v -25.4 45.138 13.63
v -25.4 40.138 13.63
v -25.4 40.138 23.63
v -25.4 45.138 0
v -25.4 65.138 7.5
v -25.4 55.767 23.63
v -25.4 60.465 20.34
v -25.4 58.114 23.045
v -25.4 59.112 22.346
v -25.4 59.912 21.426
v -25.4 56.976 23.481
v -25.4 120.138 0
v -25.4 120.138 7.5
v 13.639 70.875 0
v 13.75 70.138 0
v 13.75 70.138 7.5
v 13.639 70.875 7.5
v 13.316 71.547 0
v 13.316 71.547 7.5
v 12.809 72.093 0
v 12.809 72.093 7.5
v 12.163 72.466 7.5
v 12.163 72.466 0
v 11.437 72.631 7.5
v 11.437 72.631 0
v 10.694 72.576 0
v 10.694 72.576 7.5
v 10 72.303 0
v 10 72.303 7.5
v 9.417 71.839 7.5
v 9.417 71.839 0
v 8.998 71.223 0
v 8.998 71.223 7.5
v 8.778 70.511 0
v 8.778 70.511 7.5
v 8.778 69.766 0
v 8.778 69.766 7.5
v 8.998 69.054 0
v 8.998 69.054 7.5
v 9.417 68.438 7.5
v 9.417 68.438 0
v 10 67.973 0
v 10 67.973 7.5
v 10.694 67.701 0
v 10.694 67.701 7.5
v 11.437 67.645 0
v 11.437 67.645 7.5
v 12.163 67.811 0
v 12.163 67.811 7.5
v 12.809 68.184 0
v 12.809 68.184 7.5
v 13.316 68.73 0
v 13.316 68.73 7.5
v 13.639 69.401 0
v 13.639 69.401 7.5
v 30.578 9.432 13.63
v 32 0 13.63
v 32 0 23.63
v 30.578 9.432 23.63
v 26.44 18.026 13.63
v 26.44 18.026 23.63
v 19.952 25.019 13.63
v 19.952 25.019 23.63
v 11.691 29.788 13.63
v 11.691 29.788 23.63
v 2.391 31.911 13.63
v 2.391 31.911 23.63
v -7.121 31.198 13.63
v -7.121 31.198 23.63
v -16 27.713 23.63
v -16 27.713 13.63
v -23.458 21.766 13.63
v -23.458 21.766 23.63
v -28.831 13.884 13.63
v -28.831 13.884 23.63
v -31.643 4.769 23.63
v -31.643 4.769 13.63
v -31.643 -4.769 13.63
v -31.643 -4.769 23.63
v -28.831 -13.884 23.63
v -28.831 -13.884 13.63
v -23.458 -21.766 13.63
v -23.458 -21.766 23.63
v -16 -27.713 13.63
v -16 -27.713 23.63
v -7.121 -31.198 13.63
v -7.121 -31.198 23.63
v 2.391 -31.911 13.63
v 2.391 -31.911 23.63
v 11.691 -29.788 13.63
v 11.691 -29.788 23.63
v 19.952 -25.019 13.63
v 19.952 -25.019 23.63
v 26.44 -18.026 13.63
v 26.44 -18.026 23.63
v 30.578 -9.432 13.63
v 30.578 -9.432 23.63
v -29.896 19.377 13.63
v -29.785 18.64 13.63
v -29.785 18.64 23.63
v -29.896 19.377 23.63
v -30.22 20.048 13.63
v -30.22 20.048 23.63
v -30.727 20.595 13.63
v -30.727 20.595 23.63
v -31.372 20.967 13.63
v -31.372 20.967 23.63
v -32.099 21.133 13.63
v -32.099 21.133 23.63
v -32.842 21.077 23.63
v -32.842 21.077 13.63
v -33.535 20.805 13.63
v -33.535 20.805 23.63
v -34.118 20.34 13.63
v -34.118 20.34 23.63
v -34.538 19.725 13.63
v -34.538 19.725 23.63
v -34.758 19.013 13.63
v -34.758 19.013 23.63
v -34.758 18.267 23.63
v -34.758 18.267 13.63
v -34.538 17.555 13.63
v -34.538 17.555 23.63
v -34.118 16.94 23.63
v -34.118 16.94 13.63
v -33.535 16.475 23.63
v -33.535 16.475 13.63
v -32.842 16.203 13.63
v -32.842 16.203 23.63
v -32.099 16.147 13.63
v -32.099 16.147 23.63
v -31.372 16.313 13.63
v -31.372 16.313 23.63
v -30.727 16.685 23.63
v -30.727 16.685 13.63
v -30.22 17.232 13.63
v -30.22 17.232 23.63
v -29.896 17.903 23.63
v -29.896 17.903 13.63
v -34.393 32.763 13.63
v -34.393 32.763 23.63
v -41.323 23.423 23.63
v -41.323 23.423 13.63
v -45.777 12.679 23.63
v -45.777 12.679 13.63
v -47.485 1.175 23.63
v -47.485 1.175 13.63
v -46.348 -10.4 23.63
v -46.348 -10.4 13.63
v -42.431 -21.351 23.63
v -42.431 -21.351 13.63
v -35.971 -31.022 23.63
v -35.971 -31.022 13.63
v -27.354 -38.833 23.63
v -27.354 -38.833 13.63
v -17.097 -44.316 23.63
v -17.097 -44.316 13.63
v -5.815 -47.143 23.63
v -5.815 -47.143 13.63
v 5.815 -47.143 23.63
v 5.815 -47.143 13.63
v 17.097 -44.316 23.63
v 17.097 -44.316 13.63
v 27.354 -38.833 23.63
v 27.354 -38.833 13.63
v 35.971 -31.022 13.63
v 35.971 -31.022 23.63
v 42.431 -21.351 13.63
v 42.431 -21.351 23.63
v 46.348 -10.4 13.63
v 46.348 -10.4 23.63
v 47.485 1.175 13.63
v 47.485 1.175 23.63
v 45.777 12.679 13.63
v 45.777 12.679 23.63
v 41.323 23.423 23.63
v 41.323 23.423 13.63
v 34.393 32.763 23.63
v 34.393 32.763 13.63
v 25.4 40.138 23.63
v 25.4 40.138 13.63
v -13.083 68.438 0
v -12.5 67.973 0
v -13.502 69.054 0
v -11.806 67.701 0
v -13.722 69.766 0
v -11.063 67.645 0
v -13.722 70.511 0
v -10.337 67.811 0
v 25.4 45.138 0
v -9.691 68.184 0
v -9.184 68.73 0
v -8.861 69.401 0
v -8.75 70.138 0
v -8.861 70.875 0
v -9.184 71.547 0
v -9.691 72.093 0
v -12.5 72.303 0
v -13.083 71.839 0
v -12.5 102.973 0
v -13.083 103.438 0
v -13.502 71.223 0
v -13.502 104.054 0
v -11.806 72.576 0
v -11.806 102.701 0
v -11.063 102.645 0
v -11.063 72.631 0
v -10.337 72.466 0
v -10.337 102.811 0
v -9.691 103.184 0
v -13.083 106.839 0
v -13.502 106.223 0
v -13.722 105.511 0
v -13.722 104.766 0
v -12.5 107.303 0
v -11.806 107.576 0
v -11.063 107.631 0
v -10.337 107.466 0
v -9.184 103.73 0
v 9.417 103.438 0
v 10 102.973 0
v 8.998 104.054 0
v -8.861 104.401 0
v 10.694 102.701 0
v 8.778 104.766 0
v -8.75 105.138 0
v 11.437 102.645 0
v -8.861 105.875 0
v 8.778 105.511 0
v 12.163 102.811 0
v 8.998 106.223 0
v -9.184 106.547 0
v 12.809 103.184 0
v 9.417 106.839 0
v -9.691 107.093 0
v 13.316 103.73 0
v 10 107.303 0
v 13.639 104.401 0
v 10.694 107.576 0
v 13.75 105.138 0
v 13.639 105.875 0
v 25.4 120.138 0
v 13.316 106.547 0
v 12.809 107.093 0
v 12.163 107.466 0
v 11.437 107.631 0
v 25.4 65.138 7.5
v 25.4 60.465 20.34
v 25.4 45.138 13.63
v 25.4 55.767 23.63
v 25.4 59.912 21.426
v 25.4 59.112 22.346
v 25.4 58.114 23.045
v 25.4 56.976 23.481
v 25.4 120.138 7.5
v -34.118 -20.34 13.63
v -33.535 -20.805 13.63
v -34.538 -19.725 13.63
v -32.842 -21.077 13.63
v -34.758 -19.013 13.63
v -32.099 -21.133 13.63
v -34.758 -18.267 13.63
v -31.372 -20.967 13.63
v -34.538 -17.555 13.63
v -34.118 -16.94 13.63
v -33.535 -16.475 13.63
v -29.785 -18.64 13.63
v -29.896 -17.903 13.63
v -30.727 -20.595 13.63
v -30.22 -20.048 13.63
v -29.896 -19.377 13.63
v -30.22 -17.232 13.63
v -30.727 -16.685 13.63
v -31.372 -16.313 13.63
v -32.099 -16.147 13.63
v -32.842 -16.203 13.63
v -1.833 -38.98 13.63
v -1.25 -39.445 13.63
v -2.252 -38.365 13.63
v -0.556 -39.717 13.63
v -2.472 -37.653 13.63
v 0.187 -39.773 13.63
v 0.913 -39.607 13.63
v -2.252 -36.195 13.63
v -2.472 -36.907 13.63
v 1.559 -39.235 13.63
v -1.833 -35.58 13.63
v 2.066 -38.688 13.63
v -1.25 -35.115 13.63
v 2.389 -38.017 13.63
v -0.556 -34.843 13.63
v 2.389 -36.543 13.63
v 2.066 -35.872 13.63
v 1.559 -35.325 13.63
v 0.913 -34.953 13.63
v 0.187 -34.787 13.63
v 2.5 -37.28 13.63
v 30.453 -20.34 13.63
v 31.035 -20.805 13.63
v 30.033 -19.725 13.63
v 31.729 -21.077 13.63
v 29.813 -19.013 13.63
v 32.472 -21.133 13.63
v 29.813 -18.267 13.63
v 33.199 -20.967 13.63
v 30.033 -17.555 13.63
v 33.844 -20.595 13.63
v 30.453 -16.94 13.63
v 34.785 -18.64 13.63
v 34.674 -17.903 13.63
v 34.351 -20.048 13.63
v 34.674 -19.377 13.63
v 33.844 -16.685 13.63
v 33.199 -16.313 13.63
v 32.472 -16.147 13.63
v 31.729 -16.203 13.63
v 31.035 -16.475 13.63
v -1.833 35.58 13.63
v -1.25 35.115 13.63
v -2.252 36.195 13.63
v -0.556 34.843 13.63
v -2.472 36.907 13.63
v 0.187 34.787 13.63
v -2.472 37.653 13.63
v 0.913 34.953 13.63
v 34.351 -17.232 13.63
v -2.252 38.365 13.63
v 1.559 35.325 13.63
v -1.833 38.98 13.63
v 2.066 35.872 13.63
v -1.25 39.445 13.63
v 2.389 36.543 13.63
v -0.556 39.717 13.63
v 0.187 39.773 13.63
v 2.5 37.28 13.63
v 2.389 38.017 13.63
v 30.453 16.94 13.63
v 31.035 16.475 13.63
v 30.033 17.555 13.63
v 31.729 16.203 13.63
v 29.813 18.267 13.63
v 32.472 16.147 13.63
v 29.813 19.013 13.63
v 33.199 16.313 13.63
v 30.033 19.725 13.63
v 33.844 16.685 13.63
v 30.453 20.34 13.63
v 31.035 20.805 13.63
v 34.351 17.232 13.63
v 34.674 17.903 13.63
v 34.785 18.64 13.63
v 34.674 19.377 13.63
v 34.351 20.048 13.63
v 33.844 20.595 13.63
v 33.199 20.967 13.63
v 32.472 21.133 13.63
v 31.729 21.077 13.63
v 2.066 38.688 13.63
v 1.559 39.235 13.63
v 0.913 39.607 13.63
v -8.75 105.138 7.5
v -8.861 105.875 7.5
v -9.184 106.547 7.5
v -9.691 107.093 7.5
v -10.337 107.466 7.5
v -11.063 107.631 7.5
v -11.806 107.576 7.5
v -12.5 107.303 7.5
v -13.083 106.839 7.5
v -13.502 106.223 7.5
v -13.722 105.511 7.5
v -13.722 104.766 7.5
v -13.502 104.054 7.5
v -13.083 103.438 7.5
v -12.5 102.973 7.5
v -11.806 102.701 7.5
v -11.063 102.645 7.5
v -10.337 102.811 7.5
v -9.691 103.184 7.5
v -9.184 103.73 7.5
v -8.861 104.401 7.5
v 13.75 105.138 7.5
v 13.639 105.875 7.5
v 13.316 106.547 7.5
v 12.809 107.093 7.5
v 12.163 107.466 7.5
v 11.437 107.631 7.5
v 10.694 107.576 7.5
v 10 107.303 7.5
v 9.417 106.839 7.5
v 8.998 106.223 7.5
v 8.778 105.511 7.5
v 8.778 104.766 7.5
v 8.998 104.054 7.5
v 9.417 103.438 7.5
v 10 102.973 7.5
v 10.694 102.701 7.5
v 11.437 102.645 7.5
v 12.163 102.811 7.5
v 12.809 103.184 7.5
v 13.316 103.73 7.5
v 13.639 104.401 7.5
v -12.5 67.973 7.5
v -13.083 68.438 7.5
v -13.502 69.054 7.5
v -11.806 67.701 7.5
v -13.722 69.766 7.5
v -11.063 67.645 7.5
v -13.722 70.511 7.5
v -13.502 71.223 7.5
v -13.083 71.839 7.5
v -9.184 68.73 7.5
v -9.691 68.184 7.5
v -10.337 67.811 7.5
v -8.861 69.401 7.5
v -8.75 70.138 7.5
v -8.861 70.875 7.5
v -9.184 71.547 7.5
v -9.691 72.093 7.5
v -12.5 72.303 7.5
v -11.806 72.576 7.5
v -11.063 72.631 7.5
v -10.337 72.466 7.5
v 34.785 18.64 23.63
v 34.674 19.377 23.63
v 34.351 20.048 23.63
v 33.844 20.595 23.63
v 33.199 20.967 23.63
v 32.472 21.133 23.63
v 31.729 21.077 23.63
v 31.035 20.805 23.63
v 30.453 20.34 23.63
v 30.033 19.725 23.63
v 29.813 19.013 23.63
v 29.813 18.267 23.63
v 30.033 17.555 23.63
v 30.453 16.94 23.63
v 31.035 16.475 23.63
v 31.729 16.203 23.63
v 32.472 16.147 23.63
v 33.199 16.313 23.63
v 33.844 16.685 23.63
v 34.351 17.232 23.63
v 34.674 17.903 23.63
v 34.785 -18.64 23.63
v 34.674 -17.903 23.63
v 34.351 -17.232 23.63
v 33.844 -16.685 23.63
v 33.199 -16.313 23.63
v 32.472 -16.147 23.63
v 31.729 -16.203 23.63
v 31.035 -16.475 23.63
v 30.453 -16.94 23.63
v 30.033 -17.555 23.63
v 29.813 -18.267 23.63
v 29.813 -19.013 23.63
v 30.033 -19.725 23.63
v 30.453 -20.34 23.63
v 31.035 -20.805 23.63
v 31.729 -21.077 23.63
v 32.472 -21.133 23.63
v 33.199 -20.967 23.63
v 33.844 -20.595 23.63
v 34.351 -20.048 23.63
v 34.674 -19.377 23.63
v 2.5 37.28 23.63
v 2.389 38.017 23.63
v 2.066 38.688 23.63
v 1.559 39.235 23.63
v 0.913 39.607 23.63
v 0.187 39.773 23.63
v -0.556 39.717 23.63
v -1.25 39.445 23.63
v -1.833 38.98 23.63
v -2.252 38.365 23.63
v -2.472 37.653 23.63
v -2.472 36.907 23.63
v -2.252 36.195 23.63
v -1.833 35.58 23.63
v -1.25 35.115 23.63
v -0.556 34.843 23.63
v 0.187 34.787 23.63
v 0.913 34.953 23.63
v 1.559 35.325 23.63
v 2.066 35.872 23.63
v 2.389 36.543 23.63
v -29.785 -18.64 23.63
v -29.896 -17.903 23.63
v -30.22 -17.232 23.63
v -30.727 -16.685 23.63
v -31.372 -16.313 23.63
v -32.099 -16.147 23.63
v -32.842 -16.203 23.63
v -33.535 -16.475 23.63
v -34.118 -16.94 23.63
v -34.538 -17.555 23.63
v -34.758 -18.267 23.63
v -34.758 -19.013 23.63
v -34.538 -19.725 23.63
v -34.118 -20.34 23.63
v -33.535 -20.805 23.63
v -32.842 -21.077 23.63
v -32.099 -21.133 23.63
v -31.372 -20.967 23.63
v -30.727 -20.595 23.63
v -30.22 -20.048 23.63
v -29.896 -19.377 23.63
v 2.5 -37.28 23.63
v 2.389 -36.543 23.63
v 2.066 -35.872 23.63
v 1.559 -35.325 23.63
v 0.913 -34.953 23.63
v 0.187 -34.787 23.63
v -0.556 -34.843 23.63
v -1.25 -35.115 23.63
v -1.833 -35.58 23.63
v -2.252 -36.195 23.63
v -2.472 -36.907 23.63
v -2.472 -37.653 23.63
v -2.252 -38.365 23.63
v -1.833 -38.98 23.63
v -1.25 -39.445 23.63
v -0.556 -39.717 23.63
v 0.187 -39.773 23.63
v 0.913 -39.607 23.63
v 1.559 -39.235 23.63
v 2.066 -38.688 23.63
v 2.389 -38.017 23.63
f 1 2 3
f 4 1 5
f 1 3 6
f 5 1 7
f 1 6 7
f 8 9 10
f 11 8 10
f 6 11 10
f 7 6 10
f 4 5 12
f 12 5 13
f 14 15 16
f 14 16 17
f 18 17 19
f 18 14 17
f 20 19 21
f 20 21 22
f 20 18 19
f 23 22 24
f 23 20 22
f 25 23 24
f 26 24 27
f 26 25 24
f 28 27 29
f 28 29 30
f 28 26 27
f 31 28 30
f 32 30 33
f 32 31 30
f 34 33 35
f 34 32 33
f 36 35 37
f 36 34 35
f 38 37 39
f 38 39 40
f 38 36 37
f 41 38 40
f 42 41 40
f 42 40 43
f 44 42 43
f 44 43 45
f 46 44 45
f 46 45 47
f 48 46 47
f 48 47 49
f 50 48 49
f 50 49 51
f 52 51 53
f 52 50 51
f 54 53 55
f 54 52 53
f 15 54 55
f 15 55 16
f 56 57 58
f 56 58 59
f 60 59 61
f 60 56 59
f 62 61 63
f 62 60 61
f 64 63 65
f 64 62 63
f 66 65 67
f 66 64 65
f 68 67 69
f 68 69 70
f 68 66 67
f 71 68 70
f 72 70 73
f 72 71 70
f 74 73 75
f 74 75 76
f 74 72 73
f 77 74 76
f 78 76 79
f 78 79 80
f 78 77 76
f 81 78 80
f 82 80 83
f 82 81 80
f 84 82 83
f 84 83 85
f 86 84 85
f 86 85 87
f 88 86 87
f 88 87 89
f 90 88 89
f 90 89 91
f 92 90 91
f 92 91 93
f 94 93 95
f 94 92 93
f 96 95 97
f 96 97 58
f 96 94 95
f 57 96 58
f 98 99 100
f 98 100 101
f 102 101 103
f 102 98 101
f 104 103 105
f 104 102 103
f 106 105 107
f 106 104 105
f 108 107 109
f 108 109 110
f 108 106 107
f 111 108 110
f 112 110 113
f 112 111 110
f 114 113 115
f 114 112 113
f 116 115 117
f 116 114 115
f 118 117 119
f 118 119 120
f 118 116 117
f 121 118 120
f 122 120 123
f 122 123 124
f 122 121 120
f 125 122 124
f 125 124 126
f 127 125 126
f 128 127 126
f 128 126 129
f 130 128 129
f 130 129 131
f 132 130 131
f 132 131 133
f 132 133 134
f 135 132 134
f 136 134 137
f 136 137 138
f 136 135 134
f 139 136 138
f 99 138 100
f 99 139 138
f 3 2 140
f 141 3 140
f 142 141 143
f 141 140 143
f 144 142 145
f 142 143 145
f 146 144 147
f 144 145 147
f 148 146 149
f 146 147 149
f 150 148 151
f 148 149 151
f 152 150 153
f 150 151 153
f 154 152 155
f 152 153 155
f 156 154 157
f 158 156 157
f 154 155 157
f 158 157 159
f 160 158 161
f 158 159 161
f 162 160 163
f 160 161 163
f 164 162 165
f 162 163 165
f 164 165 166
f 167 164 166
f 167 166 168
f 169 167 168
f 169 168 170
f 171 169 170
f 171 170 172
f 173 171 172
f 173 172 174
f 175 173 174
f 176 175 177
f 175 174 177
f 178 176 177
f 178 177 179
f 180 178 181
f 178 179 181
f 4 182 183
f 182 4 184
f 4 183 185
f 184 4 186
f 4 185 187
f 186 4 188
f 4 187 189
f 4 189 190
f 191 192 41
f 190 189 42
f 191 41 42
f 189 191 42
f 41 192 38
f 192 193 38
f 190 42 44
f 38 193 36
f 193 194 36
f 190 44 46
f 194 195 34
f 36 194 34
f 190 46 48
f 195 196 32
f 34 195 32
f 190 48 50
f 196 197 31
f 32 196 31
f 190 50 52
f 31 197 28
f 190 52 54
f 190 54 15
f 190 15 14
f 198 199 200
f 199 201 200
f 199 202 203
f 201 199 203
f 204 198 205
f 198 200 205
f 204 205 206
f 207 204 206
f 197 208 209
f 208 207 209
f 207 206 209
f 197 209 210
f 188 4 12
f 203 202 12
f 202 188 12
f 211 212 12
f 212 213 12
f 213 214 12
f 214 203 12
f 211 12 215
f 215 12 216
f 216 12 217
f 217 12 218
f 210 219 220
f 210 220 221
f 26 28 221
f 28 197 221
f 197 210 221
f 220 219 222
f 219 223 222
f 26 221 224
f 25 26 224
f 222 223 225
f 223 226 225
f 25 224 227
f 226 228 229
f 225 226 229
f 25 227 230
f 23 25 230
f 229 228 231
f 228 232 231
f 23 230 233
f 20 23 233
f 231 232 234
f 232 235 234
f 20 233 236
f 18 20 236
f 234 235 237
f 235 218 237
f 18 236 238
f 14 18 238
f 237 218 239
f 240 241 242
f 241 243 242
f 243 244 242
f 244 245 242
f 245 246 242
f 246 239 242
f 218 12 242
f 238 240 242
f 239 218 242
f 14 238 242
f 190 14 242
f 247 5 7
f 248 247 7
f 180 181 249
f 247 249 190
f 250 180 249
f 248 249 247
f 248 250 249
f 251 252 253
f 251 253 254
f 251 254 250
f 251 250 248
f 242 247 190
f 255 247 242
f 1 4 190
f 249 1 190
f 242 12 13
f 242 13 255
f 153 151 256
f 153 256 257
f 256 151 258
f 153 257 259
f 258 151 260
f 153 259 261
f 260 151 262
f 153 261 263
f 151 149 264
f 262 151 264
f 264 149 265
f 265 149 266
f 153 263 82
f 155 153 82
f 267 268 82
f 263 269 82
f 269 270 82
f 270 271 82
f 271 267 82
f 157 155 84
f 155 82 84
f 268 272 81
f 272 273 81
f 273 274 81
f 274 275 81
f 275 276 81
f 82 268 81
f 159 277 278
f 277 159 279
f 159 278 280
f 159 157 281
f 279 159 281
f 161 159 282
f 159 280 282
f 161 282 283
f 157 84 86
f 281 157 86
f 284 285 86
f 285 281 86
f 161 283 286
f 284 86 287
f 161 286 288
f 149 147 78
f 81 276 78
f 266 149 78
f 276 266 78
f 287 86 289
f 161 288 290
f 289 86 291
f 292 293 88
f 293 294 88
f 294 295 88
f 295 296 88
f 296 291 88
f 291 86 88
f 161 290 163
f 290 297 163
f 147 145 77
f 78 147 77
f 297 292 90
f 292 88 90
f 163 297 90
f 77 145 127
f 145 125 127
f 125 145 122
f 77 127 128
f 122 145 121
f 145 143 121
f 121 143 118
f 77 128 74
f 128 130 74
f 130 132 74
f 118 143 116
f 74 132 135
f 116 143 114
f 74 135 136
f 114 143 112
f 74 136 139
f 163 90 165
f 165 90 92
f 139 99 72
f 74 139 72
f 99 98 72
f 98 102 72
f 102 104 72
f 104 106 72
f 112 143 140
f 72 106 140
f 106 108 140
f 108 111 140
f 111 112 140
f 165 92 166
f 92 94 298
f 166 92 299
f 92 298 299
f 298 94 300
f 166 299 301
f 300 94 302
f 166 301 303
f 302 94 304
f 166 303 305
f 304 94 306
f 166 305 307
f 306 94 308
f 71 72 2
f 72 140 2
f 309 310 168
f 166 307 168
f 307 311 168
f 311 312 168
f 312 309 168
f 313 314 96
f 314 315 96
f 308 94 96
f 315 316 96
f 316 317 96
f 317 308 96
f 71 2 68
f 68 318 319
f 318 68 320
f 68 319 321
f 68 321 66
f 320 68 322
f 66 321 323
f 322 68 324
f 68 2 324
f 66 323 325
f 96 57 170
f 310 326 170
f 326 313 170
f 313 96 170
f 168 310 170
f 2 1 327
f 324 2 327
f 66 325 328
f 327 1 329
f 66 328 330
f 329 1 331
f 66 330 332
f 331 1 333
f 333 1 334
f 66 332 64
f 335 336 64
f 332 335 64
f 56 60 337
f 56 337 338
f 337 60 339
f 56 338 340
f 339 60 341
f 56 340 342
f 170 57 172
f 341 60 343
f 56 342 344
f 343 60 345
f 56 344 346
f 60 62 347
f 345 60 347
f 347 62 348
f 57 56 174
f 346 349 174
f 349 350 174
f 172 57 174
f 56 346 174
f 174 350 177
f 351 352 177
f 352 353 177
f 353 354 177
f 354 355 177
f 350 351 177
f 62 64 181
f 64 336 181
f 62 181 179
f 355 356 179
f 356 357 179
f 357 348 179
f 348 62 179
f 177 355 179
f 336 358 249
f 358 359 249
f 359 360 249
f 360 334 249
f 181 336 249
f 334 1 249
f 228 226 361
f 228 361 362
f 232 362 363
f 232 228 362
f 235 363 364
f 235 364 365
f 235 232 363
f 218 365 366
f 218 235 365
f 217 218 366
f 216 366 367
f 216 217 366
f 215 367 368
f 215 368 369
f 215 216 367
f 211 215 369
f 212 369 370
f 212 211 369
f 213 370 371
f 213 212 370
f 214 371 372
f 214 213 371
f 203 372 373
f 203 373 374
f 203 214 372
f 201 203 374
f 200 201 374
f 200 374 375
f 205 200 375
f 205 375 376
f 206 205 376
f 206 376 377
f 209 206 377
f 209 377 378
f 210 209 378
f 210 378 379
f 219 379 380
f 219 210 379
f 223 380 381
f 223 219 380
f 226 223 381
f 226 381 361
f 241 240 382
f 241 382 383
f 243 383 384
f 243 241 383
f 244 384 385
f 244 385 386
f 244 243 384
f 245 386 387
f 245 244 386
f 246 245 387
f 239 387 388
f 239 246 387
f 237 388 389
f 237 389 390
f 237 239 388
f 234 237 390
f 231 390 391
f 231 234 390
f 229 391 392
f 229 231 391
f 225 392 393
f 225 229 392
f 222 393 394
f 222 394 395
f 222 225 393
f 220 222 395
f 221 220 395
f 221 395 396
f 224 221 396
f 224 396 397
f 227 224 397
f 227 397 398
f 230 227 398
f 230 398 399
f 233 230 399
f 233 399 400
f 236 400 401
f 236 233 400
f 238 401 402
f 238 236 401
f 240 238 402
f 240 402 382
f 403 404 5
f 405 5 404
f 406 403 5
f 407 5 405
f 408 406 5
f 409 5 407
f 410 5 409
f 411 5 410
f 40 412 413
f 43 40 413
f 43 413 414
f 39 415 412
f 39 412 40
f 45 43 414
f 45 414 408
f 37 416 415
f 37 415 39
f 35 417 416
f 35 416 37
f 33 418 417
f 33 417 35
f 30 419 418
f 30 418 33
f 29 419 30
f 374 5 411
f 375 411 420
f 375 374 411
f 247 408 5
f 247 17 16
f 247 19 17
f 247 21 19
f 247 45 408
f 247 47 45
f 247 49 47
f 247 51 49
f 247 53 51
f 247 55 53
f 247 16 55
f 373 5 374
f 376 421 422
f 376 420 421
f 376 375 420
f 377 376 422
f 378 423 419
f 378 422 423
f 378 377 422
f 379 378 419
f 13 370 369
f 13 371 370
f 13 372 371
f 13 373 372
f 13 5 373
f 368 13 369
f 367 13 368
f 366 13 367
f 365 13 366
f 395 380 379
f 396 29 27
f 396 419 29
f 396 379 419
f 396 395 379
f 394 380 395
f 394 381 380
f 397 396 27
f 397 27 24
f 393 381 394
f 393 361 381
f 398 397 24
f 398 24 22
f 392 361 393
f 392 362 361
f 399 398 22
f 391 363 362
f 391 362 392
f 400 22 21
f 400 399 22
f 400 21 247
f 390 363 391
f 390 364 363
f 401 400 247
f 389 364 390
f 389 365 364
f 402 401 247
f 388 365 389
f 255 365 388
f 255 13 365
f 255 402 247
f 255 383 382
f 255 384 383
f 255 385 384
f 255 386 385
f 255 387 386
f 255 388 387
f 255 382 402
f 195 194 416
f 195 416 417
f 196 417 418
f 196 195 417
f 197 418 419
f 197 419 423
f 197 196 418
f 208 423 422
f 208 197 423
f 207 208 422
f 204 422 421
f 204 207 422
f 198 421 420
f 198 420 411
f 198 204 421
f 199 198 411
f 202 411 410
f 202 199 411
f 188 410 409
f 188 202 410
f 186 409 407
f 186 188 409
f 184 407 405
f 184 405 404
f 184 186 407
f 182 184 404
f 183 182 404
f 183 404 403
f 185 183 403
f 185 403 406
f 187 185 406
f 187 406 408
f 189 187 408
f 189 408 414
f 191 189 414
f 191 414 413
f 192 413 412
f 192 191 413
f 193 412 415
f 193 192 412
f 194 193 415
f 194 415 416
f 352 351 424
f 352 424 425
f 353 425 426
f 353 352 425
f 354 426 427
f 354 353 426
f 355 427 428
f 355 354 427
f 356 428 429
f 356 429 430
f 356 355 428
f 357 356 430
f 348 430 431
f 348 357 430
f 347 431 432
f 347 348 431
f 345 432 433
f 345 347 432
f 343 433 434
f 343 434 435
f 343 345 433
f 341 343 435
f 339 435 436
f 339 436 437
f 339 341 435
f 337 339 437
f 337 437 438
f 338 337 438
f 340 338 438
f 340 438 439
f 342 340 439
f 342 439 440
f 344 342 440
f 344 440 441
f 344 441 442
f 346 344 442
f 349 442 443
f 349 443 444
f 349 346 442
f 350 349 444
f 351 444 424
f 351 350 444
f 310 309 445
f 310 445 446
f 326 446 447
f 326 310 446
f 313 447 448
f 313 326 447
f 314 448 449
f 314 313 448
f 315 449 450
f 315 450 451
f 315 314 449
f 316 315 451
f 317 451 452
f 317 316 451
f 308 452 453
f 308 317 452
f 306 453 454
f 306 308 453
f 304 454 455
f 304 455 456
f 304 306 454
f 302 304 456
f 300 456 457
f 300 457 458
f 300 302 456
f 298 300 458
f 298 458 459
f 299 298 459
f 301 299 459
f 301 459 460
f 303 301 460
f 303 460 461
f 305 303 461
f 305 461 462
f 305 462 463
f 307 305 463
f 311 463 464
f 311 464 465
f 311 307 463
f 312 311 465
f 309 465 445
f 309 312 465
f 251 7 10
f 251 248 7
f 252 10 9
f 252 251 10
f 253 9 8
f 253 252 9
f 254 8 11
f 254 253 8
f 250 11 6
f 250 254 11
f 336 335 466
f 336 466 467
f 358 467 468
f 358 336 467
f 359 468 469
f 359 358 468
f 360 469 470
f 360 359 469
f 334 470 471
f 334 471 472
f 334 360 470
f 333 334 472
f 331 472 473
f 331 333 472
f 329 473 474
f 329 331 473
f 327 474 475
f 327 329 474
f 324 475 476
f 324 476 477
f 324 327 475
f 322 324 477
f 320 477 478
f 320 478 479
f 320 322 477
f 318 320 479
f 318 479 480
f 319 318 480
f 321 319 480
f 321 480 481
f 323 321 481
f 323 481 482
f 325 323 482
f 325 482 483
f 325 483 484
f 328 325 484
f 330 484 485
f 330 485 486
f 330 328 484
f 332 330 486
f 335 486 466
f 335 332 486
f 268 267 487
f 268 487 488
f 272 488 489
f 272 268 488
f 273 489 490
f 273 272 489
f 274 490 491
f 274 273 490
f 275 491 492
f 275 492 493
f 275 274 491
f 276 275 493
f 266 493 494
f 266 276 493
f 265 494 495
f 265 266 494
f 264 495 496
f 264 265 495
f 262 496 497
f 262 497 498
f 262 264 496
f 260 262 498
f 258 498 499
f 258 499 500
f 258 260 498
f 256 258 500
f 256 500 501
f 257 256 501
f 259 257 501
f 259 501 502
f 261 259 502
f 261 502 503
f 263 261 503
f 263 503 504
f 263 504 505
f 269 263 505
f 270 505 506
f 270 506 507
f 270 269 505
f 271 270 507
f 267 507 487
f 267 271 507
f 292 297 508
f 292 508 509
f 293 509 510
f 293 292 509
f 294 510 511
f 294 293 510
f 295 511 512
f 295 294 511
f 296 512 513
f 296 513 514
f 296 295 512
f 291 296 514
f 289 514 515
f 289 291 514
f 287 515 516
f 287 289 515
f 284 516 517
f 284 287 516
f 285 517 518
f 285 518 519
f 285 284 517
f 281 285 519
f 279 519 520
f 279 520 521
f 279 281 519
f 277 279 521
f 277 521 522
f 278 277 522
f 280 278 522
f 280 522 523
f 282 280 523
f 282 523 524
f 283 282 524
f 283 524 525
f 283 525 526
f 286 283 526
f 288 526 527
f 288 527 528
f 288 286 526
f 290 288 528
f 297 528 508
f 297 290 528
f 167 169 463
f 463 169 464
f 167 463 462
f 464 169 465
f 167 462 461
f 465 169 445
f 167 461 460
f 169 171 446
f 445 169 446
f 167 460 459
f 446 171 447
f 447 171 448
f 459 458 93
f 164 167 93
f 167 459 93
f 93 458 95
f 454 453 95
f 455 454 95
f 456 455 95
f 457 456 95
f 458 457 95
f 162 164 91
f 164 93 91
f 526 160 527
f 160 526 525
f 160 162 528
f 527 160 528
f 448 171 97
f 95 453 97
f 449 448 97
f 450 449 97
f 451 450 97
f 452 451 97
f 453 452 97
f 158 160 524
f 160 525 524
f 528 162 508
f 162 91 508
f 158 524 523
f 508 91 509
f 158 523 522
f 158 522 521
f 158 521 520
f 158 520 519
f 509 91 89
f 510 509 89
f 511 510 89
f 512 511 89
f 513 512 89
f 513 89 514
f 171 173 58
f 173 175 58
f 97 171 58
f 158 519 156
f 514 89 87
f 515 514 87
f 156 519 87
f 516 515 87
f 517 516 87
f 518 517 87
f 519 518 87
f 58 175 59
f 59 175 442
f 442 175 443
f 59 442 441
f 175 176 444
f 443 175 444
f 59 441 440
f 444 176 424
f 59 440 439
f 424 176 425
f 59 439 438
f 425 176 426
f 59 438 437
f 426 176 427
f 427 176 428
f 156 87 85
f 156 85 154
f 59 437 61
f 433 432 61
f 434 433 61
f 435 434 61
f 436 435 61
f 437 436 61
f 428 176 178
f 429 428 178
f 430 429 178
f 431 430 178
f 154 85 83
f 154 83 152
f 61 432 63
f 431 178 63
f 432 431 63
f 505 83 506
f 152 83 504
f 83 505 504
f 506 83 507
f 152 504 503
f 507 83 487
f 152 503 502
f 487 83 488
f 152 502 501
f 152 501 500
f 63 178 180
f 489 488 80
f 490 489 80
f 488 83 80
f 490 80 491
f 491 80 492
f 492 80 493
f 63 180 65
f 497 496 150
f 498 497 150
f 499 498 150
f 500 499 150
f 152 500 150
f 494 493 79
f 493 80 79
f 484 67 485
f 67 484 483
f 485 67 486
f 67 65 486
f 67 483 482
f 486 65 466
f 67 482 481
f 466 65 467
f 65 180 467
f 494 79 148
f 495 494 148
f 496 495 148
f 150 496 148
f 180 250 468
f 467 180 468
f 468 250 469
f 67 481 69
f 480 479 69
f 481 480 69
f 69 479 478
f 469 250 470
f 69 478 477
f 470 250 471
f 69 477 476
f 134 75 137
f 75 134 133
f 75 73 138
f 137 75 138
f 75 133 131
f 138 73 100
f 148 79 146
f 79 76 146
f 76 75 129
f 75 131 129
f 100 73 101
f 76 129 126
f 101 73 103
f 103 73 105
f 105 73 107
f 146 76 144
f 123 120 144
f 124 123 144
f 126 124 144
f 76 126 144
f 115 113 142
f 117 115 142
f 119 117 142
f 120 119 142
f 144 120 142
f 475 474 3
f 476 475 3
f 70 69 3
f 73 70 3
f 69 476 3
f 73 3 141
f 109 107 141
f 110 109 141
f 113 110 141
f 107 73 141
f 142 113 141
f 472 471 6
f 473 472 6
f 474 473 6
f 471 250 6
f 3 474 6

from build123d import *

# Parameters (mm, degrees)
SKETCH1_W           = 50.8
SKETCH1_H           = 65.000000038
SKETCH1_R           = 2.5
EXTRUDE_5_DEPTH     = 7.5
SKETCH1_3_W         = 50.8
SKETCH1_3_H         = 10
BOSS_EXTRUDE1_DEPTH = 13.63
BOSS_EXTRUDE2_START = 13.63
SKETCH1_4_R         = 2.5
SKETCH1_4_R_2       = 32
SKETCH1_4_W         = 50.8
SKETCH1_4_H         = 10
BOSS_EXTRUDE2_DEPTH = 10
CHAMFER1_SIZE       = 10
CHAMFER1_SIZE_2     = 27.474774195
FILLET1_R           = 5


with BuildPart() as part:
    # Sketch1 → 5 (new body)
    with BuildSketch(Plane.XY):
        with Locations((0, 87.638385637)):
            Rectangle(SKETCH1_W, SKETCH1_H)
        with Locations((-11.25, 70.138385656)):
            Circle(SKETCH1_R, mode=Mode.SUBTRACT)
        with Locations((-11.25, 105.138385656)):
            Circle(SKETCH1_R, mode=Mode.SUBTRACT)
        with Locations((11.25, 70.138385656)):
            Circle(SKETCH1_R, mode=Mode.SUBTRACT)
        with Locations((11.25, 105.138385656)):
            Circle(SKETCH1_R, mode=Mode.SUBTRACT)
    extrude(amount=EXTRUDE_5_DEPTH)

    # Sketch1<3> → Boss-Extrude1 (add)
    with BuildSketch(Plane.XY):
        with Locations((0, 50.138385618)):
            Rectangle(SKETCH1_3_W, SKETCH1_3_H)
    extrude(amount=BOSS_EXTRUDE1_DEPTH)

    # Sketch1<4> → Boss-Extrude2 (add)
    # profile 1 of 2: a face of its own
    with BuildSketch(Plane.XY.offset(BOSS_EXTRUDE2_START)):
        with BuildLine():
            Line((-25.4, 45.138385618), (-25.4, 40.138385618))
            ThreePointArc((-25.4, 40.138385618), (0, -47.5), (25.4, 40.138385618))
            Line((25.4, 40.138385618), (25.4, 45.138385618))
            Line((25.4, 45.138385618), (-25.4, 45.138385618))
        make_face()
        with Locations((-32.285427053, -18.64)):
            Circle(SKETCH1_4_R, mode=Mode.SUBTRACT)
        with Locations((-32.285427053, 18.64)):
            Circle(SKETCH1_4_R, mode=Mode.SUBTRACT)
        with Locations((0, -37.28)):
            Circle(SKETCH1_4_R, mode=Mode.SUBTRACT)
        with Locations((32.285427053, -18.64)):
            Circle(SKETCH1_4_R, mode=Mode.SUBTRACT)
        Circle(SKETCH1_4_R_2, mode=Mode.SUBTRACT)
        with Locations((32.285427053, 18.64)):
            Circle(SKETCH1_4_R, mode=Mode.SUBTRACT)
        with Locations((0, 37.28)):
            Circle(SKETCH1_4_R, mode=Mode.SUBTRACT)
    # profile 2 of 2: a face of its own
    with BuildSketch(Plane.XY.offset(BOSS_EXTRUDE2_START)):
        with Locations((0, 50.138385618)):
            Rectangle(SKETCH1_4_W, SKETCH1_4_H)
    extrude(amount=BOSS_EXTRUDE2_DEPTH)

    # Chamfer1
    # the kernel refuses this chamfer: 27.474774195, 10 mm, written as the material it adds along each edge
    with BuildSketch(Plane(origin=(-25.4, 55.138385618, 7.5), x_dir=(0, 0.9950833631817486, -0.0990409022520505), z_dir=(1, 0, 0))) as chamfer1_piece_1_section:
        Polygon((CHAMFER1_SIZE * 0.995083363182, CHAMFER1_SIZE * 0.0990409022521), (-CHAMFER1_SIZE_2 * 0.0990409022504, CHAMFER1_SIZE_2 * 0.995083363165), (0, 0), align=None)
    chamfer1_piece_1 = extrude(amount=50.8, mode=Mode.PRIVATE)
    chamfer1_piece_1 = split(chamfer1_piece_1, bisect_by=Plane(origin=(0, 58.754193251, 23.63), z_dir=(0, 0, -1)), keep=Keep.TOP, mode=Mode.PRIVATE)
    add(chamfer1_piece_1)

    # Fillet1
    fillet1_edges = [part.edges().sort_by_distance(p)[0] for p in [
        (0, 59.267545739, 23.63),
    ]]
    fillet(fillet1_edges, radius=FILLET1_R)


solid = part.part
